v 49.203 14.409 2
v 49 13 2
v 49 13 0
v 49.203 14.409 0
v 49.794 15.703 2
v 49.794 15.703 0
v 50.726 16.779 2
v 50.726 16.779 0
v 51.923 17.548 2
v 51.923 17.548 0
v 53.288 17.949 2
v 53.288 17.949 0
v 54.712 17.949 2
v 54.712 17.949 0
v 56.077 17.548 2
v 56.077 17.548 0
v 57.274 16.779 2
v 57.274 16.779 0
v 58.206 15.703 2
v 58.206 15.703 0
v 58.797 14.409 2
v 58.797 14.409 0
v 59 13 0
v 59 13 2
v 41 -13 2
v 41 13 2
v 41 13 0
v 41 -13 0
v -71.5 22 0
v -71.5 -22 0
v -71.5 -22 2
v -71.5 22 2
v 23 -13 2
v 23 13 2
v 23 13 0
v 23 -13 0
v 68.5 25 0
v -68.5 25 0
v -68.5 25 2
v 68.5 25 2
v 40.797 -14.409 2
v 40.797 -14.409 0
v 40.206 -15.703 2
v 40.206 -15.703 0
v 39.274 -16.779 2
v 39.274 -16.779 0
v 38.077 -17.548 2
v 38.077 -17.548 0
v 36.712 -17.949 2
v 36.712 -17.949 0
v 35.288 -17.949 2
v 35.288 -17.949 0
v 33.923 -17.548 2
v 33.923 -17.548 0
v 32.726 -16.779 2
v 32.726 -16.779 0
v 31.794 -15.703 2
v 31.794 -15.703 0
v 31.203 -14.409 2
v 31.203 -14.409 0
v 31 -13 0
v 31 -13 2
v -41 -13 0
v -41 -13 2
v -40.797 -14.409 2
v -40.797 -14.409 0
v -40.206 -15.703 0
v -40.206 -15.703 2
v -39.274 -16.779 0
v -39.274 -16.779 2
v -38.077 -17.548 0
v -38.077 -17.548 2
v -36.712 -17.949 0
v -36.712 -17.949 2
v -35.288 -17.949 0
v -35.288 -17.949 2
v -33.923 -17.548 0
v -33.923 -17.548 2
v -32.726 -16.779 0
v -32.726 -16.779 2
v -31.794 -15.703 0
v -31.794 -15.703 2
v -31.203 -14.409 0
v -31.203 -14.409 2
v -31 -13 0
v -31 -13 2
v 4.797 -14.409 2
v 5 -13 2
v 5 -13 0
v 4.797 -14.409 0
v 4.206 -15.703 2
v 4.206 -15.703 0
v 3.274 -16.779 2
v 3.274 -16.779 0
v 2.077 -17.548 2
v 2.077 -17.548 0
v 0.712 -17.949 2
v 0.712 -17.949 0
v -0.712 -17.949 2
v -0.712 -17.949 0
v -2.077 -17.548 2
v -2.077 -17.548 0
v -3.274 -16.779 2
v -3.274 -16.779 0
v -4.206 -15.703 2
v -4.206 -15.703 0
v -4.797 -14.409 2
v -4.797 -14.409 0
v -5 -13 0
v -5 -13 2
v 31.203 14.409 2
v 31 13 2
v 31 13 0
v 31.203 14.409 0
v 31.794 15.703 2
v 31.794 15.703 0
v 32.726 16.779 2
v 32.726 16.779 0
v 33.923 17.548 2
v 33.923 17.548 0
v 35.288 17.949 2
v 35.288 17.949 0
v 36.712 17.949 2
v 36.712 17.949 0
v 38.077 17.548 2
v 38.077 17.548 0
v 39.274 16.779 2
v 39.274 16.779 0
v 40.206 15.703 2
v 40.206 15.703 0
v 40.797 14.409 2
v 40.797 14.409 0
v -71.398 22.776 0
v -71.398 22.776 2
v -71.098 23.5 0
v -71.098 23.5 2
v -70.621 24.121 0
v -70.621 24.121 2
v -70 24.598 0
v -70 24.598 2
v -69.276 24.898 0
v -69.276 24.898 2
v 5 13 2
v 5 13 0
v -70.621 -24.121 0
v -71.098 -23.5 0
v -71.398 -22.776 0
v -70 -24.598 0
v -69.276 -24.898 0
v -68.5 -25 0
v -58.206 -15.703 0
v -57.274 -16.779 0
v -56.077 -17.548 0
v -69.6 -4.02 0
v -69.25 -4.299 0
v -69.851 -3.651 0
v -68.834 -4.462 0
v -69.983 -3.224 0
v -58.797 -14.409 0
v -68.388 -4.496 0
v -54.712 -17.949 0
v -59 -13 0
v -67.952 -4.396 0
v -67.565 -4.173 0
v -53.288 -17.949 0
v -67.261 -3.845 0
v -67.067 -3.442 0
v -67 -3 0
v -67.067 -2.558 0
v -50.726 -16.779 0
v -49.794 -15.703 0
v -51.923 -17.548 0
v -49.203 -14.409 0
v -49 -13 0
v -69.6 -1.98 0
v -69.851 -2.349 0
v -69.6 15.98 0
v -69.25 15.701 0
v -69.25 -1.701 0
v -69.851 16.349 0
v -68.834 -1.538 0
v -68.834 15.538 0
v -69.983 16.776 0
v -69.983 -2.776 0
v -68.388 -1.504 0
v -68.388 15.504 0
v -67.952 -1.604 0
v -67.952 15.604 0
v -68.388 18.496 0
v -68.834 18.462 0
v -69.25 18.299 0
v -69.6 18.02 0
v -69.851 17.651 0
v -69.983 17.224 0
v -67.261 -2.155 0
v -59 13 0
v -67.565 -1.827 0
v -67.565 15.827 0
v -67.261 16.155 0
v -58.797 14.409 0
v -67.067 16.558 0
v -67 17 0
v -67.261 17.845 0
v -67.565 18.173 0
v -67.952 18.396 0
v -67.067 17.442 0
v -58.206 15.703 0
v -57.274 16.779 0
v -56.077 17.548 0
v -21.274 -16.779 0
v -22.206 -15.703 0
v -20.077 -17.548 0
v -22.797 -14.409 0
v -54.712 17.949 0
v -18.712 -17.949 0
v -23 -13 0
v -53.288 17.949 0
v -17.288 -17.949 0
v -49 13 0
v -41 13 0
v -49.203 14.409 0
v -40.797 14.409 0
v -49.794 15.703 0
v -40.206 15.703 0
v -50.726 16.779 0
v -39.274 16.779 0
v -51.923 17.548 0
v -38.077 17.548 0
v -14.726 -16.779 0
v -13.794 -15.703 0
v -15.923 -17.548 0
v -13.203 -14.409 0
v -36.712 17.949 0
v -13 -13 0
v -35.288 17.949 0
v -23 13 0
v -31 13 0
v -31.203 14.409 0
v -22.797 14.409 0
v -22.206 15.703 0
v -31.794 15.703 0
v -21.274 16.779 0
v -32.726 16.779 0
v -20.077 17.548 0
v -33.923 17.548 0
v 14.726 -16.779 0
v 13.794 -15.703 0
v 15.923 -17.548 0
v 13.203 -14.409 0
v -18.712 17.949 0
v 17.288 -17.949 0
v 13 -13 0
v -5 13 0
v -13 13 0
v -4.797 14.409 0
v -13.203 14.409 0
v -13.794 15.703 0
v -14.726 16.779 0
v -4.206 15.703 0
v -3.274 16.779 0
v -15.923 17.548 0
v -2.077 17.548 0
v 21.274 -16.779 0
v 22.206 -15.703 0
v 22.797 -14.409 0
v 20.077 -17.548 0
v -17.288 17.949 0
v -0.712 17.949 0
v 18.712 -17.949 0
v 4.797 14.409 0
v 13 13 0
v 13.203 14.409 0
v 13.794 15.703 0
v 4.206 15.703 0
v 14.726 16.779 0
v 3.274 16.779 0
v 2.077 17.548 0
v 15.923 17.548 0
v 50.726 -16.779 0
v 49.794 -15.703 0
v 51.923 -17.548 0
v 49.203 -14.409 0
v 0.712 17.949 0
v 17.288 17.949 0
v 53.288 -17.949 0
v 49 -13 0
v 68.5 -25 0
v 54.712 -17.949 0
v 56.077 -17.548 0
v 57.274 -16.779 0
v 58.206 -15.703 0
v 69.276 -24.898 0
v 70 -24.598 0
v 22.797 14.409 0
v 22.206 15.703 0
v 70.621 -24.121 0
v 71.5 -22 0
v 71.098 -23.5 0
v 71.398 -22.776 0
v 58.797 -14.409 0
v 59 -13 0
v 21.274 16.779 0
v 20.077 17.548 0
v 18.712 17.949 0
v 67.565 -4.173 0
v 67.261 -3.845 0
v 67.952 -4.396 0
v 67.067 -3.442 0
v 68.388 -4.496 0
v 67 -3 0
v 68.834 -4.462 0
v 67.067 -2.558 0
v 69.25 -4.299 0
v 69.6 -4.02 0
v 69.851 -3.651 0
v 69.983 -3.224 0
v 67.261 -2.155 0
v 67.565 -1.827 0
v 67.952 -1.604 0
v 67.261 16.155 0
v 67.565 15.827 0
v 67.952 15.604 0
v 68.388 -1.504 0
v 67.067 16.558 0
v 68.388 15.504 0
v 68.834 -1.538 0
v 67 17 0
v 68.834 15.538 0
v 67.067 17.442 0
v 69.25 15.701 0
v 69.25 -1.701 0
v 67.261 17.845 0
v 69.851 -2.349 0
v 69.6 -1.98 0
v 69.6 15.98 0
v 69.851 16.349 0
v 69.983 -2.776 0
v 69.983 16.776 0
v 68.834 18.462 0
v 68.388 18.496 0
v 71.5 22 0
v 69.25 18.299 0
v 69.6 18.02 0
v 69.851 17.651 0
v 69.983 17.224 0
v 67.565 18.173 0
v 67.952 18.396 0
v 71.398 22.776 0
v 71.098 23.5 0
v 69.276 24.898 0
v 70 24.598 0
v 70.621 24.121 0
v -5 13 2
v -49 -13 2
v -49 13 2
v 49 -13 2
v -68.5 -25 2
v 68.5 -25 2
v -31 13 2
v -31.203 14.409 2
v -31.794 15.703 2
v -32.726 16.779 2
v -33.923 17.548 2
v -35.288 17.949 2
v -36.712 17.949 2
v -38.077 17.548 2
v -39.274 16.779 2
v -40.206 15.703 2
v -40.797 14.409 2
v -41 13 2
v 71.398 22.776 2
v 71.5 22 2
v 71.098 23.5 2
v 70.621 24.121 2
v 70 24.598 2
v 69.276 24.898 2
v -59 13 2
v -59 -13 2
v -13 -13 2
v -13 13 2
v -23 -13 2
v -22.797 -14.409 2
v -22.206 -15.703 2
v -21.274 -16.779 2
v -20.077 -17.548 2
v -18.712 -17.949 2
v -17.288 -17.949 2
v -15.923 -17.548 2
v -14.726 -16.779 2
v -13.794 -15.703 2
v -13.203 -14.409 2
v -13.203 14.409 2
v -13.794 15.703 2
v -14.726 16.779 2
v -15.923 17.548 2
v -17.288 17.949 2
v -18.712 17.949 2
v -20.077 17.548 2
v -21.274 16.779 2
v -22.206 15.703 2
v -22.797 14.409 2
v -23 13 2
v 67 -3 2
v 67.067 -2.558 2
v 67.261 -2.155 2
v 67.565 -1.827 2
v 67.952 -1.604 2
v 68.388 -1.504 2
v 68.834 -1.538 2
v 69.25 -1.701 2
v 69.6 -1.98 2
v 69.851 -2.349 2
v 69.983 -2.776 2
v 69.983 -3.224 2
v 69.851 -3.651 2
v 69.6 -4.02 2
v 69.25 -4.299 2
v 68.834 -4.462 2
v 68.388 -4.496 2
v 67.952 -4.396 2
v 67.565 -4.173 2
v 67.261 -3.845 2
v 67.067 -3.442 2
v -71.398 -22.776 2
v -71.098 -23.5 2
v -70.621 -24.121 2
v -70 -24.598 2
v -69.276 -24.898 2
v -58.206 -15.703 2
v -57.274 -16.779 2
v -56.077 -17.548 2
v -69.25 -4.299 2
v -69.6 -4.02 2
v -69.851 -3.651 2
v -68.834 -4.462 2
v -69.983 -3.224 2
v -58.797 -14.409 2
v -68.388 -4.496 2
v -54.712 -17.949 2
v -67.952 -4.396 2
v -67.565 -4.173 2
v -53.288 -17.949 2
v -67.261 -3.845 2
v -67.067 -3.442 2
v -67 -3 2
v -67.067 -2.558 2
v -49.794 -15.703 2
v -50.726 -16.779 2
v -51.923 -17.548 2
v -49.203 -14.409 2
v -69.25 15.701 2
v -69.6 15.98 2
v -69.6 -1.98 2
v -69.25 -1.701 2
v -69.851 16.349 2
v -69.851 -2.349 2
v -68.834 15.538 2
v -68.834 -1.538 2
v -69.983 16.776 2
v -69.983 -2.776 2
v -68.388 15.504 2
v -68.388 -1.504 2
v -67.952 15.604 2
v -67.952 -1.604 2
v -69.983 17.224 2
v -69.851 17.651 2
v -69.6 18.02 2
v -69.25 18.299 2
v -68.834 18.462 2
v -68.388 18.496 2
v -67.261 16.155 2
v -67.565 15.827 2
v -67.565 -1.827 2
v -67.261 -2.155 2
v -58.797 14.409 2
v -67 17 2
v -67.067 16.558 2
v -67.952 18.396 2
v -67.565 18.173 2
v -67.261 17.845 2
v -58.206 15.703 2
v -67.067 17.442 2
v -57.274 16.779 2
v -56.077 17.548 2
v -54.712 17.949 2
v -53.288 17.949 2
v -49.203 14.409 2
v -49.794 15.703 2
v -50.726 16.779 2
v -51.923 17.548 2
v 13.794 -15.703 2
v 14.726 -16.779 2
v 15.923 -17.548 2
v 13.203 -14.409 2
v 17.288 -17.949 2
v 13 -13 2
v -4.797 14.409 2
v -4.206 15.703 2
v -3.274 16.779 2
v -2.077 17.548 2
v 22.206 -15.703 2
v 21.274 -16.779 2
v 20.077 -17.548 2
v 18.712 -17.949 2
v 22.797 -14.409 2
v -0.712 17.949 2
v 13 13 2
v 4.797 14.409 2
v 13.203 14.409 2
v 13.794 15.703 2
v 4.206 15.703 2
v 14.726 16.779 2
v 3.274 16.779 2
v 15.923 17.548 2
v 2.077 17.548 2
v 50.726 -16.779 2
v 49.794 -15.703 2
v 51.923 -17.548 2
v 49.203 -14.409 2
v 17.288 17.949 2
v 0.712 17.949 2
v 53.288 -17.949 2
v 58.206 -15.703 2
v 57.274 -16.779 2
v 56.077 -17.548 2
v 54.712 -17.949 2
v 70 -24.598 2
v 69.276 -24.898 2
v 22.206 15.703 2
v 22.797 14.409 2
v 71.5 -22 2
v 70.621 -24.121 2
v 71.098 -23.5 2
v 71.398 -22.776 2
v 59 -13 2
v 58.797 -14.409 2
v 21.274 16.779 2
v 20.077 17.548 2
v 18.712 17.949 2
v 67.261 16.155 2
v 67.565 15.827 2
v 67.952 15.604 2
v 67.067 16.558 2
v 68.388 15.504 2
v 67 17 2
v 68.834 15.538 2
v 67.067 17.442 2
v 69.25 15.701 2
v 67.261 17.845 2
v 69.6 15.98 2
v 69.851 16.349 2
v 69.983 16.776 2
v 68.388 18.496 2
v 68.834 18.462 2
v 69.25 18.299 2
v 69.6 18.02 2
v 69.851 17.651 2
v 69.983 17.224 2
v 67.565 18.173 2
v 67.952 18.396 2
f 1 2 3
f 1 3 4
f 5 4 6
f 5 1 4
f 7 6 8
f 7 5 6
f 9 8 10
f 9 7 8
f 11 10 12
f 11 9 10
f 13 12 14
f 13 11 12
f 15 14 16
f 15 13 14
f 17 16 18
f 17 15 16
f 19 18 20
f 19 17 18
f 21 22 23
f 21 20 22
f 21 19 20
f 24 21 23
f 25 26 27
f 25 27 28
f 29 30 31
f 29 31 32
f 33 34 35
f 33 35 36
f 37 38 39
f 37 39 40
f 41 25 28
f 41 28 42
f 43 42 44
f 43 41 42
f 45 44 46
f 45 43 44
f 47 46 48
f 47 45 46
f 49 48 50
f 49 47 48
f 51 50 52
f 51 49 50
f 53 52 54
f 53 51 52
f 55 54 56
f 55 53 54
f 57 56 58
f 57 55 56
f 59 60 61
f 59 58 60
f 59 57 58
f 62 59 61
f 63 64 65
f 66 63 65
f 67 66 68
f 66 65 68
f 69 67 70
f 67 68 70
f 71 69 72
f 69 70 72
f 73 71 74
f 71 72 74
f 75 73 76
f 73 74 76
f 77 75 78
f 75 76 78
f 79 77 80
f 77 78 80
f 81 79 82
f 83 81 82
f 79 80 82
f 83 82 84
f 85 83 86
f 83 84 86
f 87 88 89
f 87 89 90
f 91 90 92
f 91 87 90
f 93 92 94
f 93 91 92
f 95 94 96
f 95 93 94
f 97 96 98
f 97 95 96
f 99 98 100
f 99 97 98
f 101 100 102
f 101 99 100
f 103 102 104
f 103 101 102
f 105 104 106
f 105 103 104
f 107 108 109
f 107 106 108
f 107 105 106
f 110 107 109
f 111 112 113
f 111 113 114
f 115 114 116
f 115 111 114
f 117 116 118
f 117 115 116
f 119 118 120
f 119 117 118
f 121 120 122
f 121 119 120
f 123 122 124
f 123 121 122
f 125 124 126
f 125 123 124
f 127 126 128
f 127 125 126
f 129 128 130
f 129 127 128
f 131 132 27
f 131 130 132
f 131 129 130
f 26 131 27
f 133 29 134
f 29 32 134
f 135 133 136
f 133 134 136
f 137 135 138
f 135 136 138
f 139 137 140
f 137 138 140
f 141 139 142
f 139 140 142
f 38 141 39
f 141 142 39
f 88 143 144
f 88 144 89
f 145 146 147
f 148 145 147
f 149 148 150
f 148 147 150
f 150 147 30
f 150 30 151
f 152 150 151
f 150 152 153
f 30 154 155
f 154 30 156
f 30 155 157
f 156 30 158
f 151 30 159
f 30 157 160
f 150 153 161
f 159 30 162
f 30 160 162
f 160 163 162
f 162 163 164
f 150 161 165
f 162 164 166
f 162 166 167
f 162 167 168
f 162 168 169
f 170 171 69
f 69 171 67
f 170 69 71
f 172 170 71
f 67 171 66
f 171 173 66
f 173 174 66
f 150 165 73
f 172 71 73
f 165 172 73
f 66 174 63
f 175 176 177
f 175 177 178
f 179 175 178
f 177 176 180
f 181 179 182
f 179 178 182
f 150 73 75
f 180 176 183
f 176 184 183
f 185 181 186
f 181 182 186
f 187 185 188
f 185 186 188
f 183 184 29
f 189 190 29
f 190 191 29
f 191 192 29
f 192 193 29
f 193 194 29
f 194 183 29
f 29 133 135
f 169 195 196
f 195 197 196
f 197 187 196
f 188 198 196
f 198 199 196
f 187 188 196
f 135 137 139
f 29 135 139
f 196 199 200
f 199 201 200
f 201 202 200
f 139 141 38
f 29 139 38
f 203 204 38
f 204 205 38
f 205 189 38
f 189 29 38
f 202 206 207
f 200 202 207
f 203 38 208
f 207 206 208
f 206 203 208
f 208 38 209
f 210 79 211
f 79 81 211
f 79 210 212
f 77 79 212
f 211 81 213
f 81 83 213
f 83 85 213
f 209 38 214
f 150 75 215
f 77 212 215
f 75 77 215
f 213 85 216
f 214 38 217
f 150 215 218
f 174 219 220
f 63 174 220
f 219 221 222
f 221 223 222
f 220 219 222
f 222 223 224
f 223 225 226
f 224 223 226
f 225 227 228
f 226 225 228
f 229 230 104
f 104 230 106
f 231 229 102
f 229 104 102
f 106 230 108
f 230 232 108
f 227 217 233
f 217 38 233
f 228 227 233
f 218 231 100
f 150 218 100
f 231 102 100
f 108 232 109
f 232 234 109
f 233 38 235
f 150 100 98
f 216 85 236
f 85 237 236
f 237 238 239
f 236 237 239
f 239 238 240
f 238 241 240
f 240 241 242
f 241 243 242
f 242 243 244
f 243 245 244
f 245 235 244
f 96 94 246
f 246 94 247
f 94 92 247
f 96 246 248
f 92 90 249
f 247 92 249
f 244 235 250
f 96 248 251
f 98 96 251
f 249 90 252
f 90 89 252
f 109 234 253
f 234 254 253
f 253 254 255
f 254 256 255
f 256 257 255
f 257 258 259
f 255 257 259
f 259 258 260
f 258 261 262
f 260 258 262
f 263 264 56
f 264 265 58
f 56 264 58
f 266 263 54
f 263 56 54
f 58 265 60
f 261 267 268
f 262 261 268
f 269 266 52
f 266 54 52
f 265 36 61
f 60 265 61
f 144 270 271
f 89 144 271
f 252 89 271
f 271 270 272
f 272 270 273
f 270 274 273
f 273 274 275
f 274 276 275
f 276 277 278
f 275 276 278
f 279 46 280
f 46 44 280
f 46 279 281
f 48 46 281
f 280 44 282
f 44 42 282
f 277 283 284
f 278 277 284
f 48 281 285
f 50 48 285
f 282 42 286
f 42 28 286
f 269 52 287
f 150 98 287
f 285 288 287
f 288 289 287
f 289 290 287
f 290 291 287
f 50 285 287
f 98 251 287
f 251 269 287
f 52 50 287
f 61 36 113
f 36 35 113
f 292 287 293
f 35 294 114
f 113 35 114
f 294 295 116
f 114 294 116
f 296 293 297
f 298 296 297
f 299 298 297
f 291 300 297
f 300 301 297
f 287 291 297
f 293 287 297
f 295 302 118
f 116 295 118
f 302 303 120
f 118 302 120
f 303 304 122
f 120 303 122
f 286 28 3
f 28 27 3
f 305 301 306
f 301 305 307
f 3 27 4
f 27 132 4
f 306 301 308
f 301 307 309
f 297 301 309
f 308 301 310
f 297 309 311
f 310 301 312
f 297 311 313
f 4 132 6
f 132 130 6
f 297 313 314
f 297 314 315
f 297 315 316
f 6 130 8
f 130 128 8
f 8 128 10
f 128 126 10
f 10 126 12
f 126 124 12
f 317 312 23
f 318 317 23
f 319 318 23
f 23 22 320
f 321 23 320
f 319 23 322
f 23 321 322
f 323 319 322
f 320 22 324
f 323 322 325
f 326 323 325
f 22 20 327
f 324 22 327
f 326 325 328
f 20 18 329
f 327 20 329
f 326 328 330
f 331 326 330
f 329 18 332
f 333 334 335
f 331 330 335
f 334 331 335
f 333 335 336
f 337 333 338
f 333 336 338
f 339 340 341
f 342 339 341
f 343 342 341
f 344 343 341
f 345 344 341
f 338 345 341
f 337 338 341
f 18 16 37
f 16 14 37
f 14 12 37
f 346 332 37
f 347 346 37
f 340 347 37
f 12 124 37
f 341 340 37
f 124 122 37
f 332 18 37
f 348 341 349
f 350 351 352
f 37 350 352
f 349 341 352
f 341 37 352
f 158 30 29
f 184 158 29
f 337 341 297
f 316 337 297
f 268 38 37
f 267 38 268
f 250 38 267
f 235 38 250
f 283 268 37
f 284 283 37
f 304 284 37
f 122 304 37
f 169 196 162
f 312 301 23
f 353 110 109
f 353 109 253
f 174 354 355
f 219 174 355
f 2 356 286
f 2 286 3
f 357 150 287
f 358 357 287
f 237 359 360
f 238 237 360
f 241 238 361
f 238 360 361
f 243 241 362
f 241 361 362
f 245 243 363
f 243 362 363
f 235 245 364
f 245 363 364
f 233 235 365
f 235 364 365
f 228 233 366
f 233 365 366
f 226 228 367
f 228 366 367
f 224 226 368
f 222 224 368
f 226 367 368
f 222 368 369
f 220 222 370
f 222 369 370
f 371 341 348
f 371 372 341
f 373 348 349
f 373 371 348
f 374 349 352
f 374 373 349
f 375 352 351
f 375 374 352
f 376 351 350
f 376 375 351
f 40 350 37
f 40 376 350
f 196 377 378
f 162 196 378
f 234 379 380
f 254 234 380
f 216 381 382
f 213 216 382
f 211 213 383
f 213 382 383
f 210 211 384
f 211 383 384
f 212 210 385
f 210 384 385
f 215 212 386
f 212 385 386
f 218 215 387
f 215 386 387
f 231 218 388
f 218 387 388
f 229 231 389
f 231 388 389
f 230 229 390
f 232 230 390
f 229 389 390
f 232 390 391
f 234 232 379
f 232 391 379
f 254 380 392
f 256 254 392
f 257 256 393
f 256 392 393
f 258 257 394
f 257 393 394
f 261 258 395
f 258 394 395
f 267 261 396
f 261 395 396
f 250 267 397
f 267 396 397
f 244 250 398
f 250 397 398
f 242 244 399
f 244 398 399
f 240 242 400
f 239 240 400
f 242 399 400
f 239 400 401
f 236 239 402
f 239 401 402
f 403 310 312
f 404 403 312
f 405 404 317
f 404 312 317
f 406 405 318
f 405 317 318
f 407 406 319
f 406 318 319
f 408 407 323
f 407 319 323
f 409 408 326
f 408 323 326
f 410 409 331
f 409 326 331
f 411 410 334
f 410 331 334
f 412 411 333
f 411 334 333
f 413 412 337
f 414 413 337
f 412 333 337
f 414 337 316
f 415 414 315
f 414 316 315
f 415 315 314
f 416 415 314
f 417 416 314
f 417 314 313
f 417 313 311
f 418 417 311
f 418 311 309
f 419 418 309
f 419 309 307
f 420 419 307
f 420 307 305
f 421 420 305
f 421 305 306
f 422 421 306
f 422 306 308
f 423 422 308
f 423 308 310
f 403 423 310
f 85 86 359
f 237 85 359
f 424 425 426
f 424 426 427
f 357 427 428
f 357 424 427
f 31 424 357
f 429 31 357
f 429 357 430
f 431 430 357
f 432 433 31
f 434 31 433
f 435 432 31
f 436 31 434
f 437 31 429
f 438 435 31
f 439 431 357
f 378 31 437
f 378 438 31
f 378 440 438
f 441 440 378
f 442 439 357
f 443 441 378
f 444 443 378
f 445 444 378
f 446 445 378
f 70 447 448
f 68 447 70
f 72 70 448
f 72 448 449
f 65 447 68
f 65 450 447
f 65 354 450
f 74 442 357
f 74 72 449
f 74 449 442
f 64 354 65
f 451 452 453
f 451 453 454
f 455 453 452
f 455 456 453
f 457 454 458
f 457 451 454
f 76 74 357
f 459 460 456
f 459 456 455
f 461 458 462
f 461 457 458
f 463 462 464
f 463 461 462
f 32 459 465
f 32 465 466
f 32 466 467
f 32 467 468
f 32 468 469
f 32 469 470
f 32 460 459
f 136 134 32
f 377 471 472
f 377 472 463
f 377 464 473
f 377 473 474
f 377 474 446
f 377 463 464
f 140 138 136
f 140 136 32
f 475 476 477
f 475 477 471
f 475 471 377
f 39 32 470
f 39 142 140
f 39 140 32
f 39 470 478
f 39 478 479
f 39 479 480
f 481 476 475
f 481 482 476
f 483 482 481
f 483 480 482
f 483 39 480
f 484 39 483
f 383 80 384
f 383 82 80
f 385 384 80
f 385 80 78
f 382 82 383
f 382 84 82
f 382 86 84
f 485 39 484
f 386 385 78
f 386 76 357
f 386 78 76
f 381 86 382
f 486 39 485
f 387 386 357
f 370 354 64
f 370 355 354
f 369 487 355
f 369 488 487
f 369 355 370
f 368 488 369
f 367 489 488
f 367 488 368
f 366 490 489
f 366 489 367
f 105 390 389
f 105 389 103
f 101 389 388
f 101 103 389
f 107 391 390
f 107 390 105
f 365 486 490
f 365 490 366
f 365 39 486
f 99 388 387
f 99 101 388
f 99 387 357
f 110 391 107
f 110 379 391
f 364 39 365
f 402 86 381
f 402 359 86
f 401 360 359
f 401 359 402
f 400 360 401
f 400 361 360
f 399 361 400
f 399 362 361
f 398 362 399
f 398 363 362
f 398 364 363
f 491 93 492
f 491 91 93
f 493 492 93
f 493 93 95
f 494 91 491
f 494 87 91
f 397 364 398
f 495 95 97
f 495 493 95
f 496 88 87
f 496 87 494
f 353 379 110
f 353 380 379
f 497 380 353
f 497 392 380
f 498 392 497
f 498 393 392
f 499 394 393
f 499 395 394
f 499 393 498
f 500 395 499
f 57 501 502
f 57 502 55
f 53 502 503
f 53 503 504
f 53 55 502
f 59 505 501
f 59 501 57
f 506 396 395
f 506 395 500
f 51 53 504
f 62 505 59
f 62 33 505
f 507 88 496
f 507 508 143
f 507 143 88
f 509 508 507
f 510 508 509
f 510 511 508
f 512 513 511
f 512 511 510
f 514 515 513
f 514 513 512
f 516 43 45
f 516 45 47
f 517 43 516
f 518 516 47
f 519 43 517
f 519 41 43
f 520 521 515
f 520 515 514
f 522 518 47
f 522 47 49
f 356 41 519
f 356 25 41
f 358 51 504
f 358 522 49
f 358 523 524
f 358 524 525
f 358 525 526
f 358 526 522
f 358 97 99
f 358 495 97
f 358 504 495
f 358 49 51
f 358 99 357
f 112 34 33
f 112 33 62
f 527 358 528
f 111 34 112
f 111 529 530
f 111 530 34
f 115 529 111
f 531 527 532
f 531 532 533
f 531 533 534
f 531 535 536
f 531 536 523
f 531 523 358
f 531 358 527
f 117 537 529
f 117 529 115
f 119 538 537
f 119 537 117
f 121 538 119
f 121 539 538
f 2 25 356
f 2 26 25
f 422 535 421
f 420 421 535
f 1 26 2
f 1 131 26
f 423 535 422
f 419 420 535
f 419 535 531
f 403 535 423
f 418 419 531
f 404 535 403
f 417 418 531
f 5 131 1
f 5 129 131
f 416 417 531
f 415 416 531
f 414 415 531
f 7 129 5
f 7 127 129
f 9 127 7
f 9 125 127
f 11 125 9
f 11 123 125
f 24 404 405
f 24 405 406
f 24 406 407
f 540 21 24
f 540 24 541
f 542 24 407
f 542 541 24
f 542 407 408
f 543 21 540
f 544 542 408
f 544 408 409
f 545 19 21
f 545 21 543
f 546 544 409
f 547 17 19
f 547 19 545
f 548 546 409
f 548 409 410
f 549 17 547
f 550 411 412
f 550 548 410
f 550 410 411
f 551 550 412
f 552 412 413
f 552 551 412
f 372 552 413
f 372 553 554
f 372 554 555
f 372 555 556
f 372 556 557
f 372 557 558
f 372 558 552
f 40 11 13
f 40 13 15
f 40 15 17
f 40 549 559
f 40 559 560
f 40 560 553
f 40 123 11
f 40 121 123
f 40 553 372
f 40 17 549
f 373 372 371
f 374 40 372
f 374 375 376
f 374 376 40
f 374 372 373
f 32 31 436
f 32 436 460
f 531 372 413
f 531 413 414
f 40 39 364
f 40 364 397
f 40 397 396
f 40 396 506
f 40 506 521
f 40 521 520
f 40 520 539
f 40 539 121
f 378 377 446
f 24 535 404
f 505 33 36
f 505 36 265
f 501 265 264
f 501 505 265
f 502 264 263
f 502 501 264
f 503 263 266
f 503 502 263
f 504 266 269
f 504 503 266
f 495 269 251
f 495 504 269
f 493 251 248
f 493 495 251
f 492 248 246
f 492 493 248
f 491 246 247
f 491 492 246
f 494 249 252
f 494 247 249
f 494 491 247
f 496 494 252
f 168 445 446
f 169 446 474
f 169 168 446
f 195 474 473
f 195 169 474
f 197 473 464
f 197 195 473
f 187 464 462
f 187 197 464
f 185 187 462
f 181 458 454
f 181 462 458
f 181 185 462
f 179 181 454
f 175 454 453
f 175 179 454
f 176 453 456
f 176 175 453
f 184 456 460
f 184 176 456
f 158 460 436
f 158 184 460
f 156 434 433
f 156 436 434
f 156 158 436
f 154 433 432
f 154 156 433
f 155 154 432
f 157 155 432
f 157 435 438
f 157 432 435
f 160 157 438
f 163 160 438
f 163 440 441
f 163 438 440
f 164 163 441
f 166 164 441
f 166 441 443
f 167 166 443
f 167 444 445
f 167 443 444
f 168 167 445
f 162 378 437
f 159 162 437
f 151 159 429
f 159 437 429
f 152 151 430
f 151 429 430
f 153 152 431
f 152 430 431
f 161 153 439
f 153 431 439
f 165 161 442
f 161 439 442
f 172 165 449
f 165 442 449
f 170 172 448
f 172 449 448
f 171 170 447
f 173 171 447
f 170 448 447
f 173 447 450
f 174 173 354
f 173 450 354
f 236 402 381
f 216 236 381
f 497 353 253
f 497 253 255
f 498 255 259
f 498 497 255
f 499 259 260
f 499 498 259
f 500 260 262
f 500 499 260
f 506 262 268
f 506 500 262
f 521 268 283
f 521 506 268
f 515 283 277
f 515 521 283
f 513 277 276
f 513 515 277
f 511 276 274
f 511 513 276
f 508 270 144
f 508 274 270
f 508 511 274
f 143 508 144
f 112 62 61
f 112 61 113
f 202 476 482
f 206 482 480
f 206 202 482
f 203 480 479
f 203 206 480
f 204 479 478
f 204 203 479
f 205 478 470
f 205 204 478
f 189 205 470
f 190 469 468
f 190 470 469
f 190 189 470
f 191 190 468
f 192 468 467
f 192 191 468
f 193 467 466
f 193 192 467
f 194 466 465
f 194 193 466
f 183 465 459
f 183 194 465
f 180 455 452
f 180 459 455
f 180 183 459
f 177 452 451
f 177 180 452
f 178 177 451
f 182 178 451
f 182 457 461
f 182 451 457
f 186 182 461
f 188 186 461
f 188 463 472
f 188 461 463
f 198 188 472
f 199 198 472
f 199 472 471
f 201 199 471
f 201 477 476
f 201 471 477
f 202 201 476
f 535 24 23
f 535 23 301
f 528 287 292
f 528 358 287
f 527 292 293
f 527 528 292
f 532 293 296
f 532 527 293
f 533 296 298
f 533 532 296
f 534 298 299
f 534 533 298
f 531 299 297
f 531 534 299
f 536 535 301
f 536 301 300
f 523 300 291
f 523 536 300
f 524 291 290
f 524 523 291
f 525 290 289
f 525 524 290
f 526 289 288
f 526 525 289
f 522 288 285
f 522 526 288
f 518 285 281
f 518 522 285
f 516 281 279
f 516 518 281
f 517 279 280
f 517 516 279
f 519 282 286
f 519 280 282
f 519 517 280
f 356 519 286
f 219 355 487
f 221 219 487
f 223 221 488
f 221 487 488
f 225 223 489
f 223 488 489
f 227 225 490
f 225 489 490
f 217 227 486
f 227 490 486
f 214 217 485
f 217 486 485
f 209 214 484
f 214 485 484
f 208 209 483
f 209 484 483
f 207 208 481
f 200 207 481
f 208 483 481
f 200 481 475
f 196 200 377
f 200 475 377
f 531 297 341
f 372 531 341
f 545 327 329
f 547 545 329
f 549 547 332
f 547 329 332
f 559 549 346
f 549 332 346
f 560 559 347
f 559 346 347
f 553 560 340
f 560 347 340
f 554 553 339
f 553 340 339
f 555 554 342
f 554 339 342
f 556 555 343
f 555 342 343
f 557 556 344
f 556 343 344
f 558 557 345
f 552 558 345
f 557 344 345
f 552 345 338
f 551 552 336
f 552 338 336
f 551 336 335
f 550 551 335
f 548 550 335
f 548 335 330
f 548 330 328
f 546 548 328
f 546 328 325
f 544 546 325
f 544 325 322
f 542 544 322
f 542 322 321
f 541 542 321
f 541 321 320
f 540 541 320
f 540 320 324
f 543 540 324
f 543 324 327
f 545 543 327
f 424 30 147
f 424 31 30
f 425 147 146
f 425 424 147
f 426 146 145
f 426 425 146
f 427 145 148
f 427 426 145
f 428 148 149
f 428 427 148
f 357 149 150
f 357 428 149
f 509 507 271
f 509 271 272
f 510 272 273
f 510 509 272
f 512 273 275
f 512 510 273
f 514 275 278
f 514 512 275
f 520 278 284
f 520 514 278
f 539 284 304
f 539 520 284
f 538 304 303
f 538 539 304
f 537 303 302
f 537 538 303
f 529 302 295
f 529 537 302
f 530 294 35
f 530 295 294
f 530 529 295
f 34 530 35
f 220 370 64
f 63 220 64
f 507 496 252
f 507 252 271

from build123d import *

# Parameters (mm, degrees)
SKETCH_1_W          = 143
SKETCH_1_H          = 50
EXTRUDE_1_DEPTH     = 2
FILLET_1_R          = 3
CUT_EXTRUDE_1_DEPTH = 10
SKETCH_7_R          = 1.5
CUT_EXTRUDE_2_DEPTH = 10


with BuildPart() as part:
    # 草图1 → 凸台-拉伸1 (new body)
    with BuildSketch(Plane.XY):
        Rectangle(SKETCH_1_W, SKETCH_1_H)
    extrude(amount=EXTRUDE_1_DEPTH)

    # 圆角1
    fillet_1_edges = [part.edges().sort_by_distance(p)[0] for p in [
        (-71.5, 25, 1),
        (71.5, 25, 1),
        (71.5, -25, 1),
        (-71.5, -25, 1),
    ]]
    fillet(fillet_1_edges, radius=FILLET_1_R)

    # 草图2 → 切除-拉伸1 (cut)
    with BuildSketch(Plane.XY.offset(2)):
        with BuildLine():
            Line((5, 13), (5, -13))
            ThreePointArc((5, -13), (0, -18), (-5, -13))
            Line((-5, -13), (-5, 13))
            ThreePointArc((-5, 13), (0, 18), (5, 13))
        make_face()
        with BuildLine():
            Line((23, 13), (23, -13))
            ThreePointArc((23, -13), (18, -18), (13, -13))
            Line((13, -13), (13, 13))
            ThreePointArc((13, 13), (18, 18), (23, 13))
        make_face()
        with BuildLine():
            Line((41, 13), (41, -13))
            ThreePointArc((41, -13), (36, -18), (31, -13))
            Line((31, -13), (31, 13))
            ThreePointArc((31, 13), (36, 18), (41, 13))
        make_face()
        with BuildLine():
            Line((59, 13), (59, -13))
            ThreePointArc((59, -13), (54, -18), (49, -13))
            Line((49, -13), (49, 13))
            ThreePointArc((49, 13), (54, 18), (59, 13))
        make_face()
        with BuildLine():
            Line((-59, 13), (-59, -13))
            ThreePointArc((-59, -13), (-54, -18), (-49, -13))
            Line((-49, -13), (-49, 13))
            ThreePointArc((-49, 13), (-54, 18), (-59, 13))
        make_face()
        with BuildLine():
            Line((-41, 13), (-41, -13))
            ThreePointArc((-41, -13), (-36, -18), (-31, -13))
            Line((-31, -13), (-31, 13))
            ThreePointArc((-31, 13), (-36, 18), (-41, 13))
        make_face()
        with BuildLine():
            Line((-23, 13), (-23, -13))
            ThreePointArc((-23, -13), (-18, -18), (-13, -13))
            Line((-13, -13), (-13, 13))
            ThreePointArc((-13, 13), (-18, 18), (-23, 13))
        make_face()
    extrude(amount=-CUT_EXTRUDE_1_DEPTH, mode=Mode.SUBTRACT)

    # 草图7 → 切除-拉伸2 (cut)
    with BuildSketch(Plane(origin=(0, 0, 0), x_dir=(-1, 0, 0), z_dir=(0, 0, -1))):
        with Locations((-68.5, -3)):
            Circle(SKETCH_7_R)
        with Locations((-68.5, 17)):
            Circle(SKETCH_7_R)
    cut_extrude_2 = extrude(amount=-CUT_EXTRUDE_2_DEPTH, mode=Mode.SUBTRACT)

    # 镜向2: 切除-拉伸2 across plane
    add(cut_extrude_2.mirror(Plane.ZY), mode=Mode.SUBTRACT)


solid = part.part
